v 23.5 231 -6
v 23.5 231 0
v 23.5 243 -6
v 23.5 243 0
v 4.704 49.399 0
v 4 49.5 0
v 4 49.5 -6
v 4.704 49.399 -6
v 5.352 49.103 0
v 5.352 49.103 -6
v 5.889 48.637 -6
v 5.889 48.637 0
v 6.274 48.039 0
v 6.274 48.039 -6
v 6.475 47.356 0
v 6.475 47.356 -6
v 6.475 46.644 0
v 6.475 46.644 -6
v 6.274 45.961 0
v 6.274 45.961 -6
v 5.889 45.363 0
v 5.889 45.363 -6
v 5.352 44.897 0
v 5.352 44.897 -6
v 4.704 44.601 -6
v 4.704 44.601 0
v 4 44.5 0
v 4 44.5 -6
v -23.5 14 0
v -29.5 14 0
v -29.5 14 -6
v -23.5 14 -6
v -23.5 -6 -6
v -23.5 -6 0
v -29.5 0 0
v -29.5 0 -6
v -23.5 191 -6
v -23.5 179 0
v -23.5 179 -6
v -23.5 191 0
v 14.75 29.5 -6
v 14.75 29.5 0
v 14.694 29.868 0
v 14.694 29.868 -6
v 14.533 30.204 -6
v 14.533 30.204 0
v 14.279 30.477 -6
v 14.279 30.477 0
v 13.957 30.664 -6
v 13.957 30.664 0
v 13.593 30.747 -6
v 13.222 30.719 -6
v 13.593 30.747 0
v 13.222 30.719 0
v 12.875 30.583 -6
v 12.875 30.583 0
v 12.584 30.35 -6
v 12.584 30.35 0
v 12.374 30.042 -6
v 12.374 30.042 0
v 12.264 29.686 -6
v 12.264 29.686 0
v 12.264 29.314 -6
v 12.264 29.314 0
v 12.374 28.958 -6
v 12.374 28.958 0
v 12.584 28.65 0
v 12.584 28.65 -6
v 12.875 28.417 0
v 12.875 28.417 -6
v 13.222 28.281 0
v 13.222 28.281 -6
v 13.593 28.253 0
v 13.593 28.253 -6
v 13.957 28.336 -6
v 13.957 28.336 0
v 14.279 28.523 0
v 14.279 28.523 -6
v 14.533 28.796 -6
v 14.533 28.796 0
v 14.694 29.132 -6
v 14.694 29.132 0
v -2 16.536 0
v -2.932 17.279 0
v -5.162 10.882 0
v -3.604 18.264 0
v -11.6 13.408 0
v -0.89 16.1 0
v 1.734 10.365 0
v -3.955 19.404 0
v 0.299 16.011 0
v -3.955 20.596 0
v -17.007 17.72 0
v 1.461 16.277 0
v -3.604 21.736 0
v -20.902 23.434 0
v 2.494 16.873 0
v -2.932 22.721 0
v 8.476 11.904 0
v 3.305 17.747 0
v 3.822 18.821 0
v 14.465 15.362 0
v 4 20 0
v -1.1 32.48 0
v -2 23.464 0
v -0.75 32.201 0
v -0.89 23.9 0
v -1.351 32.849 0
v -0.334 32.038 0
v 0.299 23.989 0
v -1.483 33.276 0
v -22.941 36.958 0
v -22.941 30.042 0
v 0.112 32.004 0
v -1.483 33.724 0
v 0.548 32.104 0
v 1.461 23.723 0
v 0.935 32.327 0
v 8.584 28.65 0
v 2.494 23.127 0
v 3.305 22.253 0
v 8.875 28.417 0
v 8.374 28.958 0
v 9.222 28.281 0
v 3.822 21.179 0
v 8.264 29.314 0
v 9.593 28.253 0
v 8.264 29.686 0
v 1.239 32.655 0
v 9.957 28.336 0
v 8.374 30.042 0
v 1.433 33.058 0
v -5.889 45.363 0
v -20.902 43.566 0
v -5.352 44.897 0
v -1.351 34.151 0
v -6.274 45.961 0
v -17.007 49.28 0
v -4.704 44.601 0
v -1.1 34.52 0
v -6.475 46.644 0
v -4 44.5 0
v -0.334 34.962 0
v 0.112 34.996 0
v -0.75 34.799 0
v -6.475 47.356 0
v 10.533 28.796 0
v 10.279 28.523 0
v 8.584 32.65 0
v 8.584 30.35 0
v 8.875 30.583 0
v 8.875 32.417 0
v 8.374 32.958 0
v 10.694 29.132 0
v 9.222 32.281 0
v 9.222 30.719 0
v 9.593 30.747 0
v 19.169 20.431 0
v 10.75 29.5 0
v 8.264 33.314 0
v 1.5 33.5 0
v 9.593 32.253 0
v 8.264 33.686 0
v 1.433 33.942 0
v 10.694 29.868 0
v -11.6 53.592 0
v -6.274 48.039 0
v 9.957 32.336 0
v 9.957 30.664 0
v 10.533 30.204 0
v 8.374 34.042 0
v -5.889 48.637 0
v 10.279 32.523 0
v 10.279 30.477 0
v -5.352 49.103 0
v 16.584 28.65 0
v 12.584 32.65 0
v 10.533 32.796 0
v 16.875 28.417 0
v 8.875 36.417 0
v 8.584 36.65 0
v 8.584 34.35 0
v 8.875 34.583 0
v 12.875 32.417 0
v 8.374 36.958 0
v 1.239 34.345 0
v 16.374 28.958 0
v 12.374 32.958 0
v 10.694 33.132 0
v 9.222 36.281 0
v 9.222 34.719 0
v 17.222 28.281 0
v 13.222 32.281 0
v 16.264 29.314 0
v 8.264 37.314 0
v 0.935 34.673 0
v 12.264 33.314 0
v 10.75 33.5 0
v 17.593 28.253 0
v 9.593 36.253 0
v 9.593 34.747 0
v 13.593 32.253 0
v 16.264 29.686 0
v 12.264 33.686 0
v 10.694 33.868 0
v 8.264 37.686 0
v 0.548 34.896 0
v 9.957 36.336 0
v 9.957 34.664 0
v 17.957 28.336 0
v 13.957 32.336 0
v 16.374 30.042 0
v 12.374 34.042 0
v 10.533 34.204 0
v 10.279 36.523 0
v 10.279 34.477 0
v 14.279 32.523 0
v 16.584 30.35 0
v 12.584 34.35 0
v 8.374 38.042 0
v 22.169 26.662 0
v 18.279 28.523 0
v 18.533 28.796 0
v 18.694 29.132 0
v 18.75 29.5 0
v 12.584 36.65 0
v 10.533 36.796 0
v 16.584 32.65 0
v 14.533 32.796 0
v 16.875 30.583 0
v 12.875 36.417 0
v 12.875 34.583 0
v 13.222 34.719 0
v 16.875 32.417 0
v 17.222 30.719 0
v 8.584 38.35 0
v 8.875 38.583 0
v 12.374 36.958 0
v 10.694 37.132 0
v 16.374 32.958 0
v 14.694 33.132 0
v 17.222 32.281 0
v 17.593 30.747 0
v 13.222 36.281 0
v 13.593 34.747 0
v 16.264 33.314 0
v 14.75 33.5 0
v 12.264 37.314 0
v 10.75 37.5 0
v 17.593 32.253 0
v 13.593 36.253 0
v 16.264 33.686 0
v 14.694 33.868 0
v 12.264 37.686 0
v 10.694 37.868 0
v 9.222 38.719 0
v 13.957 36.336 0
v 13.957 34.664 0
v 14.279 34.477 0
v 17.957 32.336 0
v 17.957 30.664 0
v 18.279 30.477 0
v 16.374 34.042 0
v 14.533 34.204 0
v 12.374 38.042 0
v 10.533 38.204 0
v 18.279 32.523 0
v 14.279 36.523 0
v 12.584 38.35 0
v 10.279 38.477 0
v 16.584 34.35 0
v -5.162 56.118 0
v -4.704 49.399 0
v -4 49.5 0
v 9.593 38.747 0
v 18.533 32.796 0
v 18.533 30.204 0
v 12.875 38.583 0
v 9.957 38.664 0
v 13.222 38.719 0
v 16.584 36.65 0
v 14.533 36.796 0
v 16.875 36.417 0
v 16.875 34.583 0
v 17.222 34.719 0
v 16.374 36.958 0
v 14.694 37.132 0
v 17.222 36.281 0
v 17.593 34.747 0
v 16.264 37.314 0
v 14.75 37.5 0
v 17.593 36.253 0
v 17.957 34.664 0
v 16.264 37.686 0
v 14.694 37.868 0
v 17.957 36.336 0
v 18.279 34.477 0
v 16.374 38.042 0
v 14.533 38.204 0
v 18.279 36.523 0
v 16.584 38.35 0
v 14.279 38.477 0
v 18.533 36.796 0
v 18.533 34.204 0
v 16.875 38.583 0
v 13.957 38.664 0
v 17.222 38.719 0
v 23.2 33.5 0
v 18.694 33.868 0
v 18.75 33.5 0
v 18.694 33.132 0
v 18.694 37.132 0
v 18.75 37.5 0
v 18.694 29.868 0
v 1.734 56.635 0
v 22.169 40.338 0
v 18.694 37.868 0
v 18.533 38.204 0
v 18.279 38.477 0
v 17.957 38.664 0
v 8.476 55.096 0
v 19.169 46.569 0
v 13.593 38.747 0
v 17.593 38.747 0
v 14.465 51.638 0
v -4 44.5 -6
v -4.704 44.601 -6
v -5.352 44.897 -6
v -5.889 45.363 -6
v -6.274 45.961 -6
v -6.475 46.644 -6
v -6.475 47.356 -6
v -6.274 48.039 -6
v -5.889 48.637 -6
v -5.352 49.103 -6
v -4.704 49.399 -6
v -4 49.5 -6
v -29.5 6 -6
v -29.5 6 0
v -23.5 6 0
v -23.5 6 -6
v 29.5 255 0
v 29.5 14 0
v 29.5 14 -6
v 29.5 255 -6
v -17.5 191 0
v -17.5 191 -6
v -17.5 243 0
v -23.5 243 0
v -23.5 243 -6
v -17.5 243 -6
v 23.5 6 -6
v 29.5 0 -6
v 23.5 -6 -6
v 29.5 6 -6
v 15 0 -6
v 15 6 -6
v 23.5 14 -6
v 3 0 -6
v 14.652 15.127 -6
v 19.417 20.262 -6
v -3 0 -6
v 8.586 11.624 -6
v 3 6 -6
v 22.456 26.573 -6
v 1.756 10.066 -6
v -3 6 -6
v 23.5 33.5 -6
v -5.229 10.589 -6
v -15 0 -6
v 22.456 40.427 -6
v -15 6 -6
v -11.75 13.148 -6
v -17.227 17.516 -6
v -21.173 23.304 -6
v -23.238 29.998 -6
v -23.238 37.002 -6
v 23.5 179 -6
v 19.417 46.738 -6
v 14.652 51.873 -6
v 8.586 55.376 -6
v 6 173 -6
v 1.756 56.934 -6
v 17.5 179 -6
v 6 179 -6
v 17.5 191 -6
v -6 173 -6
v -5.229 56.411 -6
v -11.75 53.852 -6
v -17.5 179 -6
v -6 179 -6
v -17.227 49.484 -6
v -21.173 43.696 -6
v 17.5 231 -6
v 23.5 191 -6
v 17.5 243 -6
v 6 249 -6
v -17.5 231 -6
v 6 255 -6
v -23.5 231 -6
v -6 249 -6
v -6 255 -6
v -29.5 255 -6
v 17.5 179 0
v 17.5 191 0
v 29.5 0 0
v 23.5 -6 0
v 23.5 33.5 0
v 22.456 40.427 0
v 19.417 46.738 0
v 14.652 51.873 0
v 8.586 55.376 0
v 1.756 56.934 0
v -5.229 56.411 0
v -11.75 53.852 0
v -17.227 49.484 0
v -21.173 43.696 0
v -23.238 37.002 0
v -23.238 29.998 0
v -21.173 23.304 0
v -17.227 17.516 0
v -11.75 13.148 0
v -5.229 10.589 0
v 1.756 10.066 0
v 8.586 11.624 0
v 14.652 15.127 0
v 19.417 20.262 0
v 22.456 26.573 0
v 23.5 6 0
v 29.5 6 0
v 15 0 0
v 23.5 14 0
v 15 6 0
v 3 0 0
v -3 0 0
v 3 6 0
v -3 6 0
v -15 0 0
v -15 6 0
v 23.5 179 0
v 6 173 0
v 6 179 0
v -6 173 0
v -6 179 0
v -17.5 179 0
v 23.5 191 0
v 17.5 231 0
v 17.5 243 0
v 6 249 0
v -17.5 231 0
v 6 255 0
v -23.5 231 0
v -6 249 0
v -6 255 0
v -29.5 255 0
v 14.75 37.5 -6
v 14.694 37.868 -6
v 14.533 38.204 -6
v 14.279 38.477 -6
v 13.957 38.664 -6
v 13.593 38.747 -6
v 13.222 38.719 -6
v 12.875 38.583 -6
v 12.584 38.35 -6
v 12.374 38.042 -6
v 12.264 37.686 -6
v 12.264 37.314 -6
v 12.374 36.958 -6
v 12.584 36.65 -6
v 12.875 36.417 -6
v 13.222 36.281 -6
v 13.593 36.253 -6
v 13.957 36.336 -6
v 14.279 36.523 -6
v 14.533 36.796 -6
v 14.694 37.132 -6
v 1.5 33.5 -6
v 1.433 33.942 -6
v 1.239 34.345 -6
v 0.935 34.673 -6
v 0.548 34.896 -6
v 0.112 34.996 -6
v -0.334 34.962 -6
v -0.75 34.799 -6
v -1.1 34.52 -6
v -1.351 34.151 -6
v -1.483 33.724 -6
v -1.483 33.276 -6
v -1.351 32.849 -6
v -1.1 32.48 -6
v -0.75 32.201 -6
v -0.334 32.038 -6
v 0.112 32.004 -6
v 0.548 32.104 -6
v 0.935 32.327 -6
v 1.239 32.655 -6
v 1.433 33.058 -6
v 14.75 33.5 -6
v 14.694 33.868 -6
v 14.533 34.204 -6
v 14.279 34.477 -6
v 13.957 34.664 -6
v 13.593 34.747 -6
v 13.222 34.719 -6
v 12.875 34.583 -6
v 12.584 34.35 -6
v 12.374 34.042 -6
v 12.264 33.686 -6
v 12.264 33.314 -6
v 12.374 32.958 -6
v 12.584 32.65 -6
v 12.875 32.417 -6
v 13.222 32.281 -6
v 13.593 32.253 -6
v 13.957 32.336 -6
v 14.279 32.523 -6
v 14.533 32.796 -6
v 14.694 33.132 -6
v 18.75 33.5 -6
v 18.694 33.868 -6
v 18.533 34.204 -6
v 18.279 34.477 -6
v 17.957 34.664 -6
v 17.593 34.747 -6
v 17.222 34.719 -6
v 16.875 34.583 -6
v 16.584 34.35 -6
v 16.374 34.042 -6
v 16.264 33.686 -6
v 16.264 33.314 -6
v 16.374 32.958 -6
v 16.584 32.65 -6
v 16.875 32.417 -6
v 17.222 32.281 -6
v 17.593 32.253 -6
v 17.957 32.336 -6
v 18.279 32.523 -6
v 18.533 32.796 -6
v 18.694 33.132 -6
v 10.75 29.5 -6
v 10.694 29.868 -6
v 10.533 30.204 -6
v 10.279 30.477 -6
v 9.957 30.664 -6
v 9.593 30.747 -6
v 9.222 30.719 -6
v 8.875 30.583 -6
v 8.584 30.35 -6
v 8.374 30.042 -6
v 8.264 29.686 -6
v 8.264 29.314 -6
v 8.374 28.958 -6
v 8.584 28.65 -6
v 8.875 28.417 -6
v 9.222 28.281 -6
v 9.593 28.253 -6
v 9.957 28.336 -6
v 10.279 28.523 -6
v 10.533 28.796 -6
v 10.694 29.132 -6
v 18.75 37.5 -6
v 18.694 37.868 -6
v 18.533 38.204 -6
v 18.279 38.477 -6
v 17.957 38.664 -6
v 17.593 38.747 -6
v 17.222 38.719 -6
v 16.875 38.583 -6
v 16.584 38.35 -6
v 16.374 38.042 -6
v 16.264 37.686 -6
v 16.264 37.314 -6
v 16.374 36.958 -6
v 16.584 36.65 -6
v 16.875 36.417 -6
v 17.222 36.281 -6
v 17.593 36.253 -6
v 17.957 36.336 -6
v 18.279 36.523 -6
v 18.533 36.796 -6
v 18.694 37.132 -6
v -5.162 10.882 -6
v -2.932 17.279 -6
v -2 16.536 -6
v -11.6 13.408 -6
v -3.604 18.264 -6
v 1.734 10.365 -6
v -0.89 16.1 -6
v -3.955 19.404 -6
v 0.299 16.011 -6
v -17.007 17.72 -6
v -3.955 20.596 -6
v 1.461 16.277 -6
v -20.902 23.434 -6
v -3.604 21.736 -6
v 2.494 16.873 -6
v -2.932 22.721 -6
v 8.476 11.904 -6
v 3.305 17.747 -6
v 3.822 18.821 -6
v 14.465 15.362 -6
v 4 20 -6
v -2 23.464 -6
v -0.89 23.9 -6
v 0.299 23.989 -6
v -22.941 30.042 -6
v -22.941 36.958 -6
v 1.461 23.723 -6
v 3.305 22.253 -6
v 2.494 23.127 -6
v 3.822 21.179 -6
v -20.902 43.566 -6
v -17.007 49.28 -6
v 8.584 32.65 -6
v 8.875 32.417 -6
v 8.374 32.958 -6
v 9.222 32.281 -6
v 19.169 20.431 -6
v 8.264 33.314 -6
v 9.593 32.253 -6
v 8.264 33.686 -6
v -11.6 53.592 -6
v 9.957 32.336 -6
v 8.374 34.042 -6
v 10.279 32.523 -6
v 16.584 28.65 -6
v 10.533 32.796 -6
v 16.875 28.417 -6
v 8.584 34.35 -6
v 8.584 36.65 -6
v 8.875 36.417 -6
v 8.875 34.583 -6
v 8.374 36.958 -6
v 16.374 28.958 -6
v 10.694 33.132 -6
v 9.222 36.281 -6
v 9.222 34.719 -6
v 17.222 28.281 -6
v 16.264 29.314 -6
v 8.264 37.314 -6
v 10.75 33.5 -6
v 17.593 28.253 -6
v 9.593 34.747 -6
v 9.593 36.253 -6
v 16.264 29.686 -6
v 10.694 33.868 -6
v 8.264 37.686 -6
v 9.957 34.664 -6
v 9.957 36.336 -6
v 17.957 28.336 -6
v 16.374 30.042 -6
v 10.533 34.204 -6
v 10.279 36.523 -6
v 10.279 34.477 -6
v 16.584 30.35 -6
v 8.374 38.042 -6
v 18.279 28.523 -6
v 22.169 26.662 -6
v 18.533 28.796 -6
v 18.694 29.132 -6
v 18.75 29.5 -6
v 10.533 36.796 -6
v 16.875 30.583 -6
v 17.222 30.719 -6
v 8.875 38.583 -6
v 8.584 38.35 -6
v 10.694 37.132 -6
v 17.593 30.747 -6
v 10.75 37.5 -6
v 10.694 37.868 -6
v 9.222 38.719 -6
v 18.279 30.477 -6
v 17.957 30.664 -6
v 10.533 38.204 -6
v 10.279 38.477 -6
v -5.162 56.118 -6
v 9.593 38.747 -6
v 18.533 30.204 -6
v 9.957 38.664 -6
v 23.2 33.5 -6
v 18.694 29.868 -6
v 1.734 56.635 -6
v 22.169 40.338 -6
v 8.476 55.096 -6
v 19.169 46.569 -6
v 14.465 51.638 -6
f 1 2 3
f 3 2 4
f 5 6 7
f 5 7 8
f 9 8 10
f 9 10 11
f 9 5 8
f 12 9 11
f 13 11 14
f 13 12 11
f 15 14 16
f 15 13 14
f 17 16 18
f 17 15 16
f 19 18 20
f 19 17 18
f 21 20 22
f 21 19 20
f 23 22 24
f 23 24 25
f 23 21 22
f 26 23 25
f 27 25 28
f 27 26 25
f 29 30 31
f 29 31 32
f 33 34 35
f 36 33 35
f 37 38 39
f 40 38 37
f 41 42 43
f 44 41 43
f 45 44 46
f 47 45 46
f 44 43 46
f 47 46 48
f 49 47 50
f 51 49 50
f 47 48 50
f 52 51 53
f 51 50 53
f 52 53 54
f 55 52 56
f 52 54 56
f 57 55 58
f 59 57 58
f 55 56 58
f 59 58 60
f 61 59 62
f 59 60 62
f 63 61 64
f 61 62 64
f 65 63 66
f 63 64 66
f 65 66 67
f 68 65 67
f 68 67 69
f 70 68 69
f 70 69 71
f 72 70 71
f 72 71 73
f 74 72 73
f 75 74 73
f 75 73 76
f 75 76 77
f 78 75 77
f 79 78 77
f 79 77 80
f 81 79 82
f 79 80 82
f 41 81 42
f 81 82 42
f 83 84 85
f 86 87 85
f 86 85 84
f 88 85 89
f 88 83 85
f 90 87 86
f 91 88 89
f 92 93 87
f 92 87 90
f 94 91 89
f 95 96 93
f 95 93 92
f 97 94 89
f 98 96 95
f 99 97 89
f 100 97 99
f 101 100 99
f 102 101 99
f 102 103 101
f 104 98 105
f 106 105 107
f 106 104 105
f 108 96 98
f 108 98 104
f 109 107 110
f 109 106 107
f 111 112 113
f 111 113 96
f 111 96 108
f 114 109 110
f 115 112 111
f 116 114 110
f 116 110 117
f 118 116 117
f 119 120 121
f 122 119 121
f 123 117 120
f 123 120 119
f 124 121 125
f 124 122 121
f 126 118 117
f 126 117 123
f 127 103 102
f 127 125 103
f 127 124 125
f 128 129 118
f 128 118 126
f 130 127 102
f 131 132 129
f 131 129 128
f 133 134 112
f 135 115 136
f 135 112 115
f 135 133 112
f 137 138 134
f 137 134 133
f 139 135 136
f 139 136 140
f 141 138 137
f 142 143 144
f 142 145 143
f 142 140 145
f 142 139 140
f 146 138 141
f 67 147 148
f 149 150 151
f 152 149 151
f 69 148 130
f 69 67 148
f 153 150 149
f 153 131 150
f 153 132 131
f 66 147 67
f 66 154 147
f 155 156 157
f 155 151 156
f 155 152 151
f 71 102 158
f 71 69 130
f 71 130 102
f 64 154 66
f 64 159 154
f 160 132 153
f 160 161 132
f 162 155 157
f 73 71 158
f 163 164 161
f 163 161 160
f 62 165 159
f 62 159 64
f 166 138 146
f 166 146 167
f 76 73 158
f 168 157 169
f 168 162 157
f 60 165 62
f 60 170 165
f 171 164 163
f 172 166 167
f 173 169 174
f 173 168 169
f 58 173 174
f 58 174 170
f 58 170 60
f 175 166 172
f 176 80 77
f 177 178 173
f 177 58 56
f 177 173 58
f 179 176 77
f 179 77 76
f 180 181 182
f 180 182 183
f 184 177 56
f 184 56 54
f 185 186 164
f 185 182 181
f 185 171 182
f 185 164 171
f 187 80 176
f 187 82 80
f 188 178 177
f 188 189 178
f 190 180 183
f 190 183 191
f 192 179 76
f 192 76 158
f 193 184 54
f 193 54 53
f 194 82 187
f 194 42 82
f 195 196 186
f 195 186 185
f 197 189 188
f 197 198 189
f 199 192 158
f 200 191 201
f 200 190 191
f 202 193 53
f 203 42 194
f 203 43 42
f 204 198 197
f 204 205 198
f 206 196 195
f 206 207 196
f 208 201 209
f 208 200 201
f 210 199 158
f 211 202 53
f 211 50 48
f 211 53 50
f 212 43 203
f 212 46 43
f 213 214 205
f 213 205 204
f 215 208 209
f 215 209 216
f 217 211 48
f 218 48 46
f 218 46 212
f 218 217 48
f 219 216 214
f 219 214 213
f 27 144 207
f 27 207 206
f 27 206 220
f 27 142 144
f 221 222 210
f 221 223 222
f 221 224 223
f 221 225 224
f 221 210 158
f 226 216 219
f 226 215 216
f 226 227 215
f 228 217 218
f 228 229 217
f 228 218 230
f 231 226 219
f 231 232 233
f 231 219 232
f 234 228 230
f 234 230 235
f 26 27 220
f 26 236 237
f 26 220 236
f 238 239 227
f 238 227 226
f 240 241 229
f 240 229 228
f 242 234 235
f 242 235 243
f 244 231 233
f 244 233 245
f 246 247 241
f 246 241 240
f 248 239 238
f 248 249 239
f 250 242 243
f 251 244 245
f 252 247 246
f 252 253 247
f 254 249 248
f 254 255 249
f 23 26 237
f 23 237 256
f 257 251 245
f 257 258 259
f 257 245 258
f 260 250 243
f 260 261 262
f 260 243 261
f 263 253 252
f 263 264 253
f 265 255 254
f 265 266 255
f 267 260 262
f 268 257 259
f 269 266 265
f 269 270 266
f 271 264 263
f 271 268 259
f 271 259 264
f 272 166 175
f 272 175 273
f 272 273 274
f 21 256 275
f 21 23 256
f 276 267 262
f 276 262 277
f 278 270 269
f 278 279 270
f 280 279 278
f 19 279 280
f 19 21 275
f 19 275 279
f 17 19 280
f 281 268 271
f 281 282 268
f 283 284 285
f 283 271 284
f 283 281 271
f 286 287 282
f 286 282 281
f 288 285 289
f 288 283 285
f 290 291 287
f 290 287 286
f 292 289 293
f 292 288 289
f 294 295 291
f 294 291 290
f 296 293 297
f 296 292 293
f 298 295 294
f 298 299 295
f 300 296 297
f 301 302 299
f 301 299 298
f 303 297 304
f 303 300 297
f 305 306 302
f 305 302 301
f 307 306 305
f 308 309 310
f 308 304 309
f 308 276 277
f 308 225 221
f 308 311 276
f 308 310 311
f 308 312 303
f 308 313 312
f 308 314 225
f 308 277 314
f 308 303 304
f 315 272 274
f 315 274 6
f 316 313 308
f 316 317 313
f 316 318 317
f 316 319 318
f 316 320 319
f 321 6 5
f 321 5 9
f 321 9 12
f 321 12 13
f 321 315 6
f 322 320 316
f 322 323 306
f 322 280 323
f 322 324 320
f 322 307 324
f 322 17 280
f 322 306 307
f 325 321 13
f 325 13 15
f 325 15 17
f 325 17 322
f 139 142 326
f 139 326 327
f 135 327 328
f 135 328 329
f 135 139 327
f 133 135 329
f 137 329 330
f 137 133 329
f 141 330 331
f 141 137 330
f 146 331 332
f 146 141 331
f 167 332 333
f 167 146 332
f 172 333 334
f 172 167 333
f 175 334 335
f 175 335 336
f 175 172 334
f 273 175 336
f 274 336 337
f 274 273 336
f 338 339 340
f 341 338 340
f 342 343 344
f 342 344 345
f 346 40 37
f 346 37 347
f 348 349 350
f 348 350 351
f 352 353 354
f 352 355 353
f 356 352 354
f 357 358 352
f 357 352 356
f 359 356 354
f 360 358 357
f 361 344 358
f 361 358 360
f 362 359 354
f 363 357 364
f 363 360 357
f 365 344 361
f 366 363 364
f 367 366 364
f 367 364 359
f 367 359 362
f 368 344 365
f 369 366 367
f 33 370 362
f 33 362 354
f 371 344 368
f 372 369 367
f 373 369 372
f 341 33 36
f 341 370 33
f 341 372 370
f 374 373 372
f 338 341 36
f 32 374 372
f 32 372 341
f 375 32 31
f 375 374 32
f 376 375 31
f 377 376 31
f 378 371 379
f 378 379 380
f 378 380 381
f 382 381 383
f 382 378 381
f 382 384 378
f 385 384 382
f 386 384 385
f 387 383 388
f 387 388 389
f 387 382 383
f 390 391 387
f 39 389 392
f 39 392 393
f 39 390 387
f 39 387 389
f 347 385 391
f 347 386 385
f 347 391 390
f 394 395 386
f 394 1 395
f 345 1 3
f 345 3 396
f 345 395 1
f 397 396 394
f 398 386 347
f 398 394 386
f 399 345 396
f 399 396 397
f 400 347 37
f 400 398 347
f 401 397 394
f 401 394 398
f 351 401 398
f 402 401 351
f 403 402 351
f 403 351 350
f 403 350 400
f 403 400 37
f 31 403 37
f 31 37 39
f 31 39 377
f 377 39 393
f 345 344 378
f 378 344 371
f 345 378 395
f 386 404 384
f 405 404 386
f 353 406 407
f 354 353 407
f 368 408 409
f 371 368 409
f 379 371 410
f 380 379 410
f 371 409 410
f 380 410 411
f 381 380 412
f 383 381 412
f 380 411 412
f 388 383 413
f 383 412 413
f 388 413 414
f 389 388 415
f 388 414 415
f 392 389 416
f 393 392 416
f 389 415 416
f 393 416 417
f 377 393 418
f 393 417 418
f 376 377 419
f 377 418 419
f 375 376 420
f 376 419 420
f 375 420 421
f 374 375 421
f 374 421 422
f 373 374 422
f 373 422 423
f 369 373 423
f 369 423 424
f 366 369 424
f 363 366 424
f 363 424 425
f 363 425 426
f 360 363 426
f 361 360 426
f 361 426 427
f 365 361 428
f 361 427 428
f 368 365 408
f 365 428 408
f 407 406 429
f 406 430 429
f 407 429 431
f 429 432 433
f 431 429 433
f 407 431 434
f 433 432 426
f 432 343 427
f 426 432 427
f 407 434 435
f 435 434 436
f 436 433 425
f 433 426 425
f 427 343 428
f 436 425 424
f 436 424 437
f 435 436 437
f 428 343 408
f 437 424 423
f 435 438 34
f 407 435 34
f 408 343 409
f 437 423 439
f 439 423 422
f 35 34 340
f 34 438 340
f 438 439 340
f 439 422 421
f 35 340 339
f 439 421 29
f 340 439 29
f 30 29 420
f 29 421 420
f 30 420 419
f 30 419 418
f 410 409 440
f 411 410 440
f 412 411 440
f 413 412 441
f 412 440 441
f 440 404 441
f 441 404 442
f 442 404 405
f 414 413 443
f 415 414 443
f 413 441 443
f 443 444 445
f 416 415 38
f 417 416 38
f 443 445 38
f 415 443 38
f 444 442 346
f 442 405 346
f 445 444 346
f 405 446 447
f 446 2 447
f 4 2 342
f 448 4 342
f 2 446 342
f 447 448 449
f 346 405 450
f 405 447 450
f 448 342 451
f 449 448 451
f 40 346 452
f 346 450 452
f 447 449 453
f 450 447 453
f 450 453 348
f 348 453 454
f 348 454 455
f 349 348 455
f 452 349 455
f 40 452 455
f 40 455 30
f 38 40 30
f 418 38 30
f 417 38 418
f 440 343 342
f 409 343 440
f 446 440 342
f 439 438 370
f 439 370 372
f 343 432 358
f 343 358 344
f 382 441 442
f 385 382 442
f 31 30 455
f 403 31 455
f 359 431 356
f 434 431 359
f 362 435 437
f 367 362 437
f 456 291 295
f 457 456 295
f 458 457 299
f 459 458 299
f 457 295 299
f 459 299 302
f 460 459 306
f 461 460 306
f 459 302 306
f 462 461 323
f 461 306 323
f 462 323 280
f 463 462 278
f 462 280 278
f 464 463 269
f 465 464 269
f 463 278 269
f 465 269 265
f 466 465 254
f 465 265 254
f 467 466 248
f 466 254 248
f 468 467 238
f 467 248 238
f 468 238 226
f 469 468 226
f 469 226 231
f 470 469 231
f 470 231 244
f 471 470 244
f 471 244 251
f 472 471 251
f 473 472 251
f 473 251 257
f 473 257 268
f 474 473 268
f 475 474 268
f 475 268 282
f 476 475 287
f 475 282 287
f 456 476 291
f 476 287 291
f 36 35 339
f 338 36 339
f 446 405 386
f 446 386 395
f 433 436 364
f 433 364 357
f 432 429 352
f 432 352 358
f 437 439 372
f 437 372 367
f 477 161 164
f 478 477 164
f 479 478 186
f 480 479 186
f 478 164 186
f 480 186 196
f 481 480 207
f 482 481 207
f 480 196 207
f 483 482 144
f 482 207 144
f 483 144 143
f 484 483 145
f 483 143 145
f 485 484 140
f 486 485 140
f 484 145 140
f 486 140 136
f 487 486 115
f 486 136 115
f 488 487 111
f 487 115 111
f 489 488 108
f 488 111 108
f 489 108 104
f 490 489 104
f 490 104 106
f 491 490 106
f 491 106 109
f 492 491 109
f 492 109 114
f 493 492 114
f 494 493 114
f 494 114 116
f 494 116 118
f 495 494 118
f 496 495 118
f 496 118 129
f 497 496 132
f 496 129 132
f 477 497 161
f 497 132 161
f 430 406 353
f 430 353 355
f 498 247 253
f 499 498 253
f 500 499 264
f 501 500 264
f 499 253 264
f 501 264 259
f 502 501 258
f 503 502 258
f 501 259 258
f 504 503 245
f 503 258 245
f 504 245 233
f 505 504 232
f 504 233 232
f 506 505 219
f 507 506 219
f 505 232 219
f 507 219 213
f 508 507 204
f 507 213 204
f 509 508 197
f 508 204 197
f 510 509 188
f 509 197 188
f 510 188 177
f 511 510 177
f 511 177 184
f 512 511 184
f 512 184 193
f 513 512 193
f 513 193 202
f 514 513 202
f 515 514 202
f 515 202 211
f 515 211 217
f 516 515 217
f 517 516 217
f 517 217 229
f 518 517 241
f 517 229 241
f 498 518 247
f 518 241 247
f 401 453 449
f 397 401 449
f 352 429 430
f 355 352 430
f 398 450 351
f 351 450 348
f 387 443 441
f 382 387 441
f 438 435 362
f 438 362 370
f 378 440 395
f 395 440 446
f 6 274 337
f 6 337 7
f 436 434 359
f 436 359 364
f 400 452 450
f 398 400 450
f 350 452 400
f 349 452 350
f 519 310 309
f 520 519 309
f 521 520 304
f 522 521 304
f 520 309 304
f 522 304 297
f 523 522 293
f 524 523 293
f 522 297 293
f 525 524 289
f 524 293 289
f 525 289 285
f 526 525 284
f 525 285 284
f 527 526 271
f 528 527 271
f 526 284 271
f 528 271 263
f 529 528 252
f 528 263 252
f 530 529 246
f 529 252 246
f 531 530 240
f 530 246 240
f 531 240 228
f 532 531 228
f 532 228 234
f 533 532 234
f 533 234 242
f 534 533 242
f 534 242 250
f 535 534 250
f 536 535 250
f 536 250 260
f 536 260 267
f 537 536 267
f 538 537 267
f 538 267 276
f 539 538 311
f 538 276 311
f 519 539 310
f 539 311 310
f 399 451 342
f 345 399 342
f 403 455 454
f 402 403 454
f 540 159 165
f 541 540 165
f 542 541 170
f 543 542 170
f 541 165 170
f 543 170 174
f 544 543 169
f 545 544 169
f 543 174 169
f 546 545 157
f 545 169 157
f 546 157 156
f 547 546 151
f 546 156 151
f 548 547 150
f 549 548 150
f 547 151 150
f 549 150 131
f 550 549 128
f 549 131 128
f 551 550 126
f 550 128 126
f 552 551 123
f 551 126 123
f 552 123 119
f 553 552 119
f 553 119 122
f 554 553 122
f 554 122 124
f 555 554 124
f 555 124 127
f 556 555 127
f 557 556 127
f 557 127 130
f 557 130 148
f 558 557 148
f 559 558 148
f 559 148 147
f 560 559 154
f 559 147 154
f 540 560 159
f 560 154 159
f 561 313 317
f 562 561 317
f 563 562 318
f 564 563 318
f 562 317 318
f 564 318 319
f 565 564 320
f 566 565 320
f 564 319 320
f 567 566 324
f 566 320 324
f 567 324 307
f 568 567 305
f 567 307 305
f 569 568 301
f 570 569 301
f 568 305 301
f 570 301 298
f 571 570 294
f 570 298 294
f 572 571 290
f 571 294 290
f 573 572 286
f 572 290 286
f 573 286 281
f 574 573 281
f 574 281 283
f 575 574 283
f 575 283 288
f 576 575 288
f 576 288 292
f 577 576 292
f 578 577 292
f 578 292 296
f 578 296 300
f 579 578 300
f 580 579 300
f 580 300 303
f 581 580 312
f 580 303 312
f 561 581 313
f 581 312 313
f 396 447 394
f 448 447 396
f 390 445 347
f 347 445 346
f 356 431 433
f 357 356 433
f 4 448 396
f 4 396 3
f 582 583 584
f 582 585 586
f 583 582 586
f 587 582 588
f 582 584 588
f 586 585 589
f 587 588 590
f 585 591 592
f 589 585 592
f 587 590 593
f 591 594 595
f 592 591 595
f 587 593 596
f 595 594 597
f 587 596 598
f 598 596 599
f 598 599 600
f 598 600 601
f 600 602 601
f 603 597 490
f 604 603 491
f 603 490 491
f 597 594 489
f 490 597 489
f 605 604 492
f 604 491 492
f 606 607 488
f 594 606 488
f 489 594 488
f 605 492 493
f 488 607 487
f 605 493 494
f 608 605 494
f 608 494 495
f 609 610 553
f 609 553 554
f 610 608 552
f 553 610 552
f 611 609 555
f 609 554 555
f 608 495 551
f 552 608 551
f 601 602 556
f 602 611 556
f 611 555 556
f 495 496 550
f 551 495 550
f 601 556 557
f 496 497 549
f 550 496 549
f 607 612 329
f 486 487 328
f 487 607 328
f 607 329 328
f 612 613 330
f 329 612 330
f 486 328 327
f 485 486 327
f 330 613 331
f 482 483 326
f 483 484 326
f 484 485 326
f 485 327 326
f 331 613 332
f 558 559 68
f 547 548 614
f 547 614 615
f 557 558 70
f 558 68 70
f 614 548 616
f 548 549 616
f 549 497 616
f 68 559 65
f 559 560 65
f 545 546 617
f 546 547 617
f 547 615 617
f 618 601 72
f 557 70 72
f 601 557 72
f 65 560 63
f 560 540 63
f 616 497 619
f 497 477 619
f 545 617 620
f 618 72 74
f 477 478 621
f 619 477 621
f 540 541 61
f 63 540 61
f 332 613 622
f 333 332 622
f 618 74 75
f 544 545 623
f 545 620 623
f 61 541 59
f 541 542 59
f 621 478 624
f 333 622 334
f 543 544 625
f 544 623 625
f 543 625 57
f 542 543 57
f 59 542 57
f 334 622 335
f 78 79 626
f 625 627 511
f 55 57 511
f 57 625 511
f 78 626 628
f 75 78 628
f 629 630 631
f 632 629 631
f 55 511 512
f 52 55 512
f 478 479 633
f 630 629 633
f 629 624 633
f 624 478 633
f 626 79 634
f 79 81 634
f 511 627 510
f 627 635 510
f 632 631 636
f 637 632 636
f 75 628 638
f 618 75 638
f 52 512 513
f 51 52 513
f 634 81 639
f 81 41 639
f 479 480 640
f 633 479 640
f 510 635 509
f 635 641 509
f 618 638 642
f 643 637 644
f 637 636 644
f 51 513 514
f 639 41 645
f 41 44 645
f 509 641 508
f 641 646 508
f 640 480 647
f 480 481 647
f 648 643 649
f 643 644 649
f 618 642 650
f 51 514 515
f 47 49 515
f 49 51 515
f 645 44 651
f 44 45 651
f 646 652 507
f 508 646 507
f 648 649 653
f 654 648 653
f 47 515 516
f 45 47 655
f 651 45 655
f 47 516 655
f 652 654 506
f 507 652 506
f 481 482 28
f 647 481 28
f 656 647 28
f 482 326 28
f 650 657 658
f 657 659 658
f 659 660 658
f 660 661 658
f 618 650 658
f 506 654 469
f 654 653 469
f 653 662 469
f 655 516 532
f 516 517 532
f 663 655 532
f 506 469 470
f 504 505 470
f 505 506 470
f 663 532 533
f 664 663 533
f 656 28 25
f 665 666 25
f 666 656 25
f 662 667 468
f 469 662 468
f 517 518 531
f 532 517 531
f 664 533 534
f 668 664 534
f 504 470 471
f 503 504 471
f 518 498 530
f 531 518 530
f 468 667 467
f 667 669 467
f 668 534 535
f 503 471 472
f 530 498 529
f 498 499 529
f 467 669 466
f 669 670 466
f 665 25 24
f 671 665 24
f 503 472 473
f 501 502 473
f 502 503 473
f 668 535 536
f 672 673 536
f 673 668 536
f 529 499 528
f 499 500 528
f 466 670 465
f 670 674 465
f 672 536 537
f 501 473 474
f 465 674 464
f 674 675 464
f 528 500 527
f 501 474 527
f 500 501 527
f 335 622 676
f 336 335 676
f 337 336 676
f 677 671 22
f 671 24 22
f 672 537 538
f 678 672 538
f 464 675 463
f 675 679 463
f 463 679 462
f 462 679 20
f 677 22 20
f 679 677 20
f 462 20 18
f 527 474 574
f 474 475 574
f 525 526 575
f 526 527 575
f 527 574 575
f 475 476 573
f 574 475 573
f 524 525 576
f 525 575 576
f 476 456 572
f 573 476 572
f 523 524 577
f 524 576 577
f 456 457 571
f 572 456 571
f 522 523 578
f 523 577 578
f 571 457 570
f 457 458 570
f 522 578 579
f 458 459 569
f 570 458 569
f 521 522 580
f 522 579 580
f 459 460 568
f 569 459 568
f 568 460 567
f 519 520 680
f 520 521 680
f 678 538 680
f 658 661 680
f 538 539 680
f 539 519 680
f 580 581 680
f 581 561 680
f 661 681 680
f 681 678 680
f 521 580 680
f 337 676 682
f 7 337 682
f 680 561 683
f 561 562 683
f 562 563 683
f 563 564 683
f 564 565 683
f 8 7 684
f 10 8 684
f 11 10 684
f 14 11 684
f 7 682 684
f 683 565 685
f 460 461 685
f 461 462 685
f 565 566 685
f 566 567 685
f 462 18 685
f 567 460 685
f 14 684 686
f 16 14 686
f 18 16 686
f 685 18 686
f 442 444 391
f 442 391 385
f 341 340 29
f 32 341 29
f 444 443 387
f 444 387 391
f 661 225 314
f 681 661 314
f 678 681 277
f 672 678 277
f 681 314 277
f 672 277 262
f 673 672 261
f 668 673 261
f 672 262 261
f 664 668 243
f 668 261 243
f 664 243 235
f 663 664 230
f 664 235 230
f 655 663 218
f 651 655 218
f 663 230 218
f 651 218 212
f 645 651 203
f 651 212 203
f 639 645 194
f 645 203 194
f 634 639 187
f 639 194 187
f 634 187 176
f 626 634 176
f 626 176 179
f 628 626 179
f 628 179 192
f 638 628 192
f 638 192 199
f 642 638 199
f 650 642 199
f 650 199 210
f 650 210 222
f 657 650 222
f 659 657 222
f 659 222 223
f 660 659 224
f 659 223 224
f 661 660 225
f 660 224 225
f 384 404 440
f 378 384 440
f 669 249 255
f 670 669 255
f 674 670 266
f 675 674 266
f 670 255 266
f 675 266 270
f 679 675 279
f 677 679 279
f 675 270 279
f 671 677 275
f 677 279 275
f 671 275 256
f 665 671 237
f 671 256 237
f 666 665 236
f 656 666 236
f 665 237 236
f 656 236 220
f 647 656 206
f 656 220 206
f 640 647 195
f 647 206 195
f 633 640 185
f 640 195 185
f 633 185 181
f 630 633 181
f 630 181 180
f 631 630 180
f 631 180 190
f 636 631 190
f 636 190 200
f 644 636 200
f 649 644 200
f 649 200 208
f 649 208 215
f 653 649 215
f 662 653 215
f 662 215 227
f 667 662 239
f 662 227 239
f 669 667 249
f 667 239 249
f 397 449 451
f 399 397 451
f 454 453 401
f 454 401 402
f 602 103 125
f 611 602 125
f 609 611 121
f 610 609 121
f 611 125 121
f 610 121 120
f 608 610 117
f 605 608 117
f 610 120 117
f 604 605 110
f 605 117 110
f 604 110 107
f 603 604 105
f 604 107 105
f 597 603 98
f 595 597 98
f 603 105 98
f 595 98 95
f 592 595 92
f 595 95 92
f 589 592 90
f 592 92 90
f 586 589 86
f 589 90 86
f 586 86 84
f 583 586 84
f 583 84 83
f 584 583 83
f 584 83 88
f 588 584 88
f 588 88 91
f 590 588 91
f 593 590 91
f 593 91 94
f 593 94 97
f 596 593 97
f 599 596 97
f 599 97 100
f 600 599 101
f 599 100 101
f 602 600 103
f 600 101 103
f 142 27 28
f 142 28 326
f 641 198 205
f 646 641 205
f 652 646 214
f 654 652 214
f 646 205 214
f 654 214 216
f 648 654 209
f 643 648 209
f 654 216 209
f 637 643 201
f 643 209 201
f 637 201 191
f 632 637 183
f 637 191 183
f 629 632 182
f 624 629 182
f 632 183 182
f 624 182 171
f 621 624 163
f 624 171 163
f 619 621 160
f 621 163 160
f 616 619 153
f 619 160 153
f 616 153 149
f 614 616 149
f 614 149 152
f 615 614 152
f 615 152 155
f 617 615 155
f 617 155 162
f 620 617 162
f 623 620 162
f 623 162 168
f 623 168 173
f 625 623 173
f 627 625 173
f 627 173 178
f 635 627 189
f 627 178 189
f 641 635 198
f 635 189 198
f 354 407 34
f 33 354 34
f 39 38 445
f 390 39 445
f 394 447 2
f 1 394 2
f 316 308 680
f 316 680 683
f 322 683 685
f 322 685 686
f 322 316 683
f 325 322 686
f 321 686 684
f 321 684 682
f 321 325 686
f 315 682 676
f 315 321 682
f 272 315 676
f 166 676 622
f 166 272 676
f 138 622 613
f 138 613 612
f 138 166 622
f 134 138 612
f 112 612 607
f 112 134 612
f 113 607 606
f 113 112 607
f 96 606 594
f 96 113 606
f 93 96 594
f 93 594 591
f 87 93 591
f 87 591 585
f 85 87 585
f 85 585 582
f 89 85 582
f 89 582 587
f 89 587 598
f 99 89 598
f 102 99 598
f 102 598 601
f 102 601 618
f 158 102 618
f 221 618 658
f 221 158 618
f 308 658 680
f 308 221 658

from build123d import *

# Parameters (mm, degrees)
SKETCH1_R             = 23.2
SKETCH1_R_2           = 4
SKETCH1_R_3           = 1.25
SKETCH1_R_4           = 1.5
BOSS_EXTRUDE1_DEPTH   = 6
SKETCH1_W             = 59
SKETCH1_H             = 255
SKETCH1_R_5           = 23.5
BOSS_EXTRUDE1_2_DEPTH = 6
SKETCH3_W             = 6
SKETCH3_H             = 8
SKETCH3_H_2           = 12
SKETCH3_W_2           = 12
SKETCH3_H_3           = 6
CUT_EXTRUDE1_DEPTH    = 10
BOSS_EXTRUDE3_DEPTH   = 6


with BuildPart() as part:
    # Sketch1 → Boss-Extrude1 (new body)
    with BuildSketch(Plane.XY):
        with Locations((0, 33.5)):
            Circle(SKETCH1_R)
        with Locations((0, 20)):
            Circle(SKETCH1_R_2, mode=Mode.SUBTRACT)
        with Locations((9.5, 29.5)):
            Circle(SKETCH1_R_3, mode=Mode.SUBTRACT)
        with Locations((13.5, 29.5)):
            Circle(SKETCH1_R_3, mode=Mode.SUBTRACT)
        with Locations((17.5, 29.5)):
            Circle(SKETCH1_R_3, mode=Mode.SUBTRACT)
        with Locations((13.5, 33.5)):
            Circle(SKETCH1_R_3, mode=Mode.SUBTRACT)
        with Locations((17.5, 33.5)):
            Circle(SKETCH1_R_3, mode=Mode.SUBTRACT)
        with Locations((17.5, 37.5)):
            Circle(SKETCH1_R_3, mode=Mode.SUBTRACT)
        with Locations((13.5, 37.5)):
            Circle(SKETCH1_R_3, mode=Mode.SUBTRACT)
        with Locations((9.5, 37.5)):
            Circle(SKETCH1_R_3, mode=Mode.SUBTRACT)
        with Locations((9.5, 33.5)):
            Circle(SKETCH1_R_3, mode=Mode.SUBTRACT)
        with Locations((0, 33.5)):
            Circle(SKETCH1_R_4, mode=Mode.SUBTRACT)
        with BuildLine():
            Line((-4, 49.5), (4, 49.5))
            ThreePointArc((4, 49.5), (6.5, 47), (4, 44.5))
            Line((4, 44.5), (-4, 44.5))
            ThreePointArc((-4, 44.5), (-6.5, 47), (-4, 49.5))
        make_face(mode=Mode.SUBTRACT)
    extrude(amount=-BOSS_EXTRUDE1_DEPTH)


with BuildPart() as body_2:
    # Sketch1 → Boss-Extrude1 2 (new body)
    with BuildSketch(Plane.XY):
        with Locations((0, 127.5)):
            Rectangle(SKETCH1_W, SKETCH1_H)
        with Locations((0, 33.5)):
            Circle(SKETCH1_R_5, mode=Mode.SUBTRACT)
    extrude(amount=-BOSS_EXTRUDE1_2_DEPTH)

    # Sketch3 → Cut-Extrude1 (cut)
    with BuildSketch(Plane.XY):
        with Locations((-26.5, 10)):
            Rectangle(SKETCH3_W, SKETCH3_H)
        with Locations((26.5, 10)):
            Rectangle(SKETCH3_W, SKETCH3_H)
        with Locations((20.5, 237)):
            Rectangle(SKETCH3_W, SKETCH3_H_2)
        with Locations((20.5, 185)):
            Rectangle(SKETCH3_W, SKETCH3_H_2)
        with Locations((0, 176)):
            Rectangle(SKETCH3_W_2, SKETCH3_H_3)
        with Locations((-20.5, 185)):
            Rectangle(SKETCH3_W, SKETCH3_H_2)
        with Locations((-20.5, 237)):
            Rectangle(SKETCH3_W, SKETCH3_H_2)
        with Locations((0, 252)):
            Rectangle(SKETCH3_W_2, SKETCH3_H_3)
        with Locations((-9, 3)):
            Rectangle(SKETCH3_W_2, SKETCH3_H_3)
        with Locations((9, 3)):
            Rectangle(SKETCH3_W_2, SKETCH3_H_3)
    extrude(amount=-CUT_EXTRUDE1_DEPTH, mode=Mode.SUBTRACT)

    # Sketch5 → Boss-Extrude3 (add)
    with BuildSketch(Plane.XY):
        Polygon((-29.5, 0), (-23.5, 0), (23.5, 0), (29.5, 0), (23.5, -6), (-23.5, -6), align=None)
    extrude(amount=-BOSS_EXTRUDE3_DEPTH)


solid = Compound([part.part, body_2.part])
